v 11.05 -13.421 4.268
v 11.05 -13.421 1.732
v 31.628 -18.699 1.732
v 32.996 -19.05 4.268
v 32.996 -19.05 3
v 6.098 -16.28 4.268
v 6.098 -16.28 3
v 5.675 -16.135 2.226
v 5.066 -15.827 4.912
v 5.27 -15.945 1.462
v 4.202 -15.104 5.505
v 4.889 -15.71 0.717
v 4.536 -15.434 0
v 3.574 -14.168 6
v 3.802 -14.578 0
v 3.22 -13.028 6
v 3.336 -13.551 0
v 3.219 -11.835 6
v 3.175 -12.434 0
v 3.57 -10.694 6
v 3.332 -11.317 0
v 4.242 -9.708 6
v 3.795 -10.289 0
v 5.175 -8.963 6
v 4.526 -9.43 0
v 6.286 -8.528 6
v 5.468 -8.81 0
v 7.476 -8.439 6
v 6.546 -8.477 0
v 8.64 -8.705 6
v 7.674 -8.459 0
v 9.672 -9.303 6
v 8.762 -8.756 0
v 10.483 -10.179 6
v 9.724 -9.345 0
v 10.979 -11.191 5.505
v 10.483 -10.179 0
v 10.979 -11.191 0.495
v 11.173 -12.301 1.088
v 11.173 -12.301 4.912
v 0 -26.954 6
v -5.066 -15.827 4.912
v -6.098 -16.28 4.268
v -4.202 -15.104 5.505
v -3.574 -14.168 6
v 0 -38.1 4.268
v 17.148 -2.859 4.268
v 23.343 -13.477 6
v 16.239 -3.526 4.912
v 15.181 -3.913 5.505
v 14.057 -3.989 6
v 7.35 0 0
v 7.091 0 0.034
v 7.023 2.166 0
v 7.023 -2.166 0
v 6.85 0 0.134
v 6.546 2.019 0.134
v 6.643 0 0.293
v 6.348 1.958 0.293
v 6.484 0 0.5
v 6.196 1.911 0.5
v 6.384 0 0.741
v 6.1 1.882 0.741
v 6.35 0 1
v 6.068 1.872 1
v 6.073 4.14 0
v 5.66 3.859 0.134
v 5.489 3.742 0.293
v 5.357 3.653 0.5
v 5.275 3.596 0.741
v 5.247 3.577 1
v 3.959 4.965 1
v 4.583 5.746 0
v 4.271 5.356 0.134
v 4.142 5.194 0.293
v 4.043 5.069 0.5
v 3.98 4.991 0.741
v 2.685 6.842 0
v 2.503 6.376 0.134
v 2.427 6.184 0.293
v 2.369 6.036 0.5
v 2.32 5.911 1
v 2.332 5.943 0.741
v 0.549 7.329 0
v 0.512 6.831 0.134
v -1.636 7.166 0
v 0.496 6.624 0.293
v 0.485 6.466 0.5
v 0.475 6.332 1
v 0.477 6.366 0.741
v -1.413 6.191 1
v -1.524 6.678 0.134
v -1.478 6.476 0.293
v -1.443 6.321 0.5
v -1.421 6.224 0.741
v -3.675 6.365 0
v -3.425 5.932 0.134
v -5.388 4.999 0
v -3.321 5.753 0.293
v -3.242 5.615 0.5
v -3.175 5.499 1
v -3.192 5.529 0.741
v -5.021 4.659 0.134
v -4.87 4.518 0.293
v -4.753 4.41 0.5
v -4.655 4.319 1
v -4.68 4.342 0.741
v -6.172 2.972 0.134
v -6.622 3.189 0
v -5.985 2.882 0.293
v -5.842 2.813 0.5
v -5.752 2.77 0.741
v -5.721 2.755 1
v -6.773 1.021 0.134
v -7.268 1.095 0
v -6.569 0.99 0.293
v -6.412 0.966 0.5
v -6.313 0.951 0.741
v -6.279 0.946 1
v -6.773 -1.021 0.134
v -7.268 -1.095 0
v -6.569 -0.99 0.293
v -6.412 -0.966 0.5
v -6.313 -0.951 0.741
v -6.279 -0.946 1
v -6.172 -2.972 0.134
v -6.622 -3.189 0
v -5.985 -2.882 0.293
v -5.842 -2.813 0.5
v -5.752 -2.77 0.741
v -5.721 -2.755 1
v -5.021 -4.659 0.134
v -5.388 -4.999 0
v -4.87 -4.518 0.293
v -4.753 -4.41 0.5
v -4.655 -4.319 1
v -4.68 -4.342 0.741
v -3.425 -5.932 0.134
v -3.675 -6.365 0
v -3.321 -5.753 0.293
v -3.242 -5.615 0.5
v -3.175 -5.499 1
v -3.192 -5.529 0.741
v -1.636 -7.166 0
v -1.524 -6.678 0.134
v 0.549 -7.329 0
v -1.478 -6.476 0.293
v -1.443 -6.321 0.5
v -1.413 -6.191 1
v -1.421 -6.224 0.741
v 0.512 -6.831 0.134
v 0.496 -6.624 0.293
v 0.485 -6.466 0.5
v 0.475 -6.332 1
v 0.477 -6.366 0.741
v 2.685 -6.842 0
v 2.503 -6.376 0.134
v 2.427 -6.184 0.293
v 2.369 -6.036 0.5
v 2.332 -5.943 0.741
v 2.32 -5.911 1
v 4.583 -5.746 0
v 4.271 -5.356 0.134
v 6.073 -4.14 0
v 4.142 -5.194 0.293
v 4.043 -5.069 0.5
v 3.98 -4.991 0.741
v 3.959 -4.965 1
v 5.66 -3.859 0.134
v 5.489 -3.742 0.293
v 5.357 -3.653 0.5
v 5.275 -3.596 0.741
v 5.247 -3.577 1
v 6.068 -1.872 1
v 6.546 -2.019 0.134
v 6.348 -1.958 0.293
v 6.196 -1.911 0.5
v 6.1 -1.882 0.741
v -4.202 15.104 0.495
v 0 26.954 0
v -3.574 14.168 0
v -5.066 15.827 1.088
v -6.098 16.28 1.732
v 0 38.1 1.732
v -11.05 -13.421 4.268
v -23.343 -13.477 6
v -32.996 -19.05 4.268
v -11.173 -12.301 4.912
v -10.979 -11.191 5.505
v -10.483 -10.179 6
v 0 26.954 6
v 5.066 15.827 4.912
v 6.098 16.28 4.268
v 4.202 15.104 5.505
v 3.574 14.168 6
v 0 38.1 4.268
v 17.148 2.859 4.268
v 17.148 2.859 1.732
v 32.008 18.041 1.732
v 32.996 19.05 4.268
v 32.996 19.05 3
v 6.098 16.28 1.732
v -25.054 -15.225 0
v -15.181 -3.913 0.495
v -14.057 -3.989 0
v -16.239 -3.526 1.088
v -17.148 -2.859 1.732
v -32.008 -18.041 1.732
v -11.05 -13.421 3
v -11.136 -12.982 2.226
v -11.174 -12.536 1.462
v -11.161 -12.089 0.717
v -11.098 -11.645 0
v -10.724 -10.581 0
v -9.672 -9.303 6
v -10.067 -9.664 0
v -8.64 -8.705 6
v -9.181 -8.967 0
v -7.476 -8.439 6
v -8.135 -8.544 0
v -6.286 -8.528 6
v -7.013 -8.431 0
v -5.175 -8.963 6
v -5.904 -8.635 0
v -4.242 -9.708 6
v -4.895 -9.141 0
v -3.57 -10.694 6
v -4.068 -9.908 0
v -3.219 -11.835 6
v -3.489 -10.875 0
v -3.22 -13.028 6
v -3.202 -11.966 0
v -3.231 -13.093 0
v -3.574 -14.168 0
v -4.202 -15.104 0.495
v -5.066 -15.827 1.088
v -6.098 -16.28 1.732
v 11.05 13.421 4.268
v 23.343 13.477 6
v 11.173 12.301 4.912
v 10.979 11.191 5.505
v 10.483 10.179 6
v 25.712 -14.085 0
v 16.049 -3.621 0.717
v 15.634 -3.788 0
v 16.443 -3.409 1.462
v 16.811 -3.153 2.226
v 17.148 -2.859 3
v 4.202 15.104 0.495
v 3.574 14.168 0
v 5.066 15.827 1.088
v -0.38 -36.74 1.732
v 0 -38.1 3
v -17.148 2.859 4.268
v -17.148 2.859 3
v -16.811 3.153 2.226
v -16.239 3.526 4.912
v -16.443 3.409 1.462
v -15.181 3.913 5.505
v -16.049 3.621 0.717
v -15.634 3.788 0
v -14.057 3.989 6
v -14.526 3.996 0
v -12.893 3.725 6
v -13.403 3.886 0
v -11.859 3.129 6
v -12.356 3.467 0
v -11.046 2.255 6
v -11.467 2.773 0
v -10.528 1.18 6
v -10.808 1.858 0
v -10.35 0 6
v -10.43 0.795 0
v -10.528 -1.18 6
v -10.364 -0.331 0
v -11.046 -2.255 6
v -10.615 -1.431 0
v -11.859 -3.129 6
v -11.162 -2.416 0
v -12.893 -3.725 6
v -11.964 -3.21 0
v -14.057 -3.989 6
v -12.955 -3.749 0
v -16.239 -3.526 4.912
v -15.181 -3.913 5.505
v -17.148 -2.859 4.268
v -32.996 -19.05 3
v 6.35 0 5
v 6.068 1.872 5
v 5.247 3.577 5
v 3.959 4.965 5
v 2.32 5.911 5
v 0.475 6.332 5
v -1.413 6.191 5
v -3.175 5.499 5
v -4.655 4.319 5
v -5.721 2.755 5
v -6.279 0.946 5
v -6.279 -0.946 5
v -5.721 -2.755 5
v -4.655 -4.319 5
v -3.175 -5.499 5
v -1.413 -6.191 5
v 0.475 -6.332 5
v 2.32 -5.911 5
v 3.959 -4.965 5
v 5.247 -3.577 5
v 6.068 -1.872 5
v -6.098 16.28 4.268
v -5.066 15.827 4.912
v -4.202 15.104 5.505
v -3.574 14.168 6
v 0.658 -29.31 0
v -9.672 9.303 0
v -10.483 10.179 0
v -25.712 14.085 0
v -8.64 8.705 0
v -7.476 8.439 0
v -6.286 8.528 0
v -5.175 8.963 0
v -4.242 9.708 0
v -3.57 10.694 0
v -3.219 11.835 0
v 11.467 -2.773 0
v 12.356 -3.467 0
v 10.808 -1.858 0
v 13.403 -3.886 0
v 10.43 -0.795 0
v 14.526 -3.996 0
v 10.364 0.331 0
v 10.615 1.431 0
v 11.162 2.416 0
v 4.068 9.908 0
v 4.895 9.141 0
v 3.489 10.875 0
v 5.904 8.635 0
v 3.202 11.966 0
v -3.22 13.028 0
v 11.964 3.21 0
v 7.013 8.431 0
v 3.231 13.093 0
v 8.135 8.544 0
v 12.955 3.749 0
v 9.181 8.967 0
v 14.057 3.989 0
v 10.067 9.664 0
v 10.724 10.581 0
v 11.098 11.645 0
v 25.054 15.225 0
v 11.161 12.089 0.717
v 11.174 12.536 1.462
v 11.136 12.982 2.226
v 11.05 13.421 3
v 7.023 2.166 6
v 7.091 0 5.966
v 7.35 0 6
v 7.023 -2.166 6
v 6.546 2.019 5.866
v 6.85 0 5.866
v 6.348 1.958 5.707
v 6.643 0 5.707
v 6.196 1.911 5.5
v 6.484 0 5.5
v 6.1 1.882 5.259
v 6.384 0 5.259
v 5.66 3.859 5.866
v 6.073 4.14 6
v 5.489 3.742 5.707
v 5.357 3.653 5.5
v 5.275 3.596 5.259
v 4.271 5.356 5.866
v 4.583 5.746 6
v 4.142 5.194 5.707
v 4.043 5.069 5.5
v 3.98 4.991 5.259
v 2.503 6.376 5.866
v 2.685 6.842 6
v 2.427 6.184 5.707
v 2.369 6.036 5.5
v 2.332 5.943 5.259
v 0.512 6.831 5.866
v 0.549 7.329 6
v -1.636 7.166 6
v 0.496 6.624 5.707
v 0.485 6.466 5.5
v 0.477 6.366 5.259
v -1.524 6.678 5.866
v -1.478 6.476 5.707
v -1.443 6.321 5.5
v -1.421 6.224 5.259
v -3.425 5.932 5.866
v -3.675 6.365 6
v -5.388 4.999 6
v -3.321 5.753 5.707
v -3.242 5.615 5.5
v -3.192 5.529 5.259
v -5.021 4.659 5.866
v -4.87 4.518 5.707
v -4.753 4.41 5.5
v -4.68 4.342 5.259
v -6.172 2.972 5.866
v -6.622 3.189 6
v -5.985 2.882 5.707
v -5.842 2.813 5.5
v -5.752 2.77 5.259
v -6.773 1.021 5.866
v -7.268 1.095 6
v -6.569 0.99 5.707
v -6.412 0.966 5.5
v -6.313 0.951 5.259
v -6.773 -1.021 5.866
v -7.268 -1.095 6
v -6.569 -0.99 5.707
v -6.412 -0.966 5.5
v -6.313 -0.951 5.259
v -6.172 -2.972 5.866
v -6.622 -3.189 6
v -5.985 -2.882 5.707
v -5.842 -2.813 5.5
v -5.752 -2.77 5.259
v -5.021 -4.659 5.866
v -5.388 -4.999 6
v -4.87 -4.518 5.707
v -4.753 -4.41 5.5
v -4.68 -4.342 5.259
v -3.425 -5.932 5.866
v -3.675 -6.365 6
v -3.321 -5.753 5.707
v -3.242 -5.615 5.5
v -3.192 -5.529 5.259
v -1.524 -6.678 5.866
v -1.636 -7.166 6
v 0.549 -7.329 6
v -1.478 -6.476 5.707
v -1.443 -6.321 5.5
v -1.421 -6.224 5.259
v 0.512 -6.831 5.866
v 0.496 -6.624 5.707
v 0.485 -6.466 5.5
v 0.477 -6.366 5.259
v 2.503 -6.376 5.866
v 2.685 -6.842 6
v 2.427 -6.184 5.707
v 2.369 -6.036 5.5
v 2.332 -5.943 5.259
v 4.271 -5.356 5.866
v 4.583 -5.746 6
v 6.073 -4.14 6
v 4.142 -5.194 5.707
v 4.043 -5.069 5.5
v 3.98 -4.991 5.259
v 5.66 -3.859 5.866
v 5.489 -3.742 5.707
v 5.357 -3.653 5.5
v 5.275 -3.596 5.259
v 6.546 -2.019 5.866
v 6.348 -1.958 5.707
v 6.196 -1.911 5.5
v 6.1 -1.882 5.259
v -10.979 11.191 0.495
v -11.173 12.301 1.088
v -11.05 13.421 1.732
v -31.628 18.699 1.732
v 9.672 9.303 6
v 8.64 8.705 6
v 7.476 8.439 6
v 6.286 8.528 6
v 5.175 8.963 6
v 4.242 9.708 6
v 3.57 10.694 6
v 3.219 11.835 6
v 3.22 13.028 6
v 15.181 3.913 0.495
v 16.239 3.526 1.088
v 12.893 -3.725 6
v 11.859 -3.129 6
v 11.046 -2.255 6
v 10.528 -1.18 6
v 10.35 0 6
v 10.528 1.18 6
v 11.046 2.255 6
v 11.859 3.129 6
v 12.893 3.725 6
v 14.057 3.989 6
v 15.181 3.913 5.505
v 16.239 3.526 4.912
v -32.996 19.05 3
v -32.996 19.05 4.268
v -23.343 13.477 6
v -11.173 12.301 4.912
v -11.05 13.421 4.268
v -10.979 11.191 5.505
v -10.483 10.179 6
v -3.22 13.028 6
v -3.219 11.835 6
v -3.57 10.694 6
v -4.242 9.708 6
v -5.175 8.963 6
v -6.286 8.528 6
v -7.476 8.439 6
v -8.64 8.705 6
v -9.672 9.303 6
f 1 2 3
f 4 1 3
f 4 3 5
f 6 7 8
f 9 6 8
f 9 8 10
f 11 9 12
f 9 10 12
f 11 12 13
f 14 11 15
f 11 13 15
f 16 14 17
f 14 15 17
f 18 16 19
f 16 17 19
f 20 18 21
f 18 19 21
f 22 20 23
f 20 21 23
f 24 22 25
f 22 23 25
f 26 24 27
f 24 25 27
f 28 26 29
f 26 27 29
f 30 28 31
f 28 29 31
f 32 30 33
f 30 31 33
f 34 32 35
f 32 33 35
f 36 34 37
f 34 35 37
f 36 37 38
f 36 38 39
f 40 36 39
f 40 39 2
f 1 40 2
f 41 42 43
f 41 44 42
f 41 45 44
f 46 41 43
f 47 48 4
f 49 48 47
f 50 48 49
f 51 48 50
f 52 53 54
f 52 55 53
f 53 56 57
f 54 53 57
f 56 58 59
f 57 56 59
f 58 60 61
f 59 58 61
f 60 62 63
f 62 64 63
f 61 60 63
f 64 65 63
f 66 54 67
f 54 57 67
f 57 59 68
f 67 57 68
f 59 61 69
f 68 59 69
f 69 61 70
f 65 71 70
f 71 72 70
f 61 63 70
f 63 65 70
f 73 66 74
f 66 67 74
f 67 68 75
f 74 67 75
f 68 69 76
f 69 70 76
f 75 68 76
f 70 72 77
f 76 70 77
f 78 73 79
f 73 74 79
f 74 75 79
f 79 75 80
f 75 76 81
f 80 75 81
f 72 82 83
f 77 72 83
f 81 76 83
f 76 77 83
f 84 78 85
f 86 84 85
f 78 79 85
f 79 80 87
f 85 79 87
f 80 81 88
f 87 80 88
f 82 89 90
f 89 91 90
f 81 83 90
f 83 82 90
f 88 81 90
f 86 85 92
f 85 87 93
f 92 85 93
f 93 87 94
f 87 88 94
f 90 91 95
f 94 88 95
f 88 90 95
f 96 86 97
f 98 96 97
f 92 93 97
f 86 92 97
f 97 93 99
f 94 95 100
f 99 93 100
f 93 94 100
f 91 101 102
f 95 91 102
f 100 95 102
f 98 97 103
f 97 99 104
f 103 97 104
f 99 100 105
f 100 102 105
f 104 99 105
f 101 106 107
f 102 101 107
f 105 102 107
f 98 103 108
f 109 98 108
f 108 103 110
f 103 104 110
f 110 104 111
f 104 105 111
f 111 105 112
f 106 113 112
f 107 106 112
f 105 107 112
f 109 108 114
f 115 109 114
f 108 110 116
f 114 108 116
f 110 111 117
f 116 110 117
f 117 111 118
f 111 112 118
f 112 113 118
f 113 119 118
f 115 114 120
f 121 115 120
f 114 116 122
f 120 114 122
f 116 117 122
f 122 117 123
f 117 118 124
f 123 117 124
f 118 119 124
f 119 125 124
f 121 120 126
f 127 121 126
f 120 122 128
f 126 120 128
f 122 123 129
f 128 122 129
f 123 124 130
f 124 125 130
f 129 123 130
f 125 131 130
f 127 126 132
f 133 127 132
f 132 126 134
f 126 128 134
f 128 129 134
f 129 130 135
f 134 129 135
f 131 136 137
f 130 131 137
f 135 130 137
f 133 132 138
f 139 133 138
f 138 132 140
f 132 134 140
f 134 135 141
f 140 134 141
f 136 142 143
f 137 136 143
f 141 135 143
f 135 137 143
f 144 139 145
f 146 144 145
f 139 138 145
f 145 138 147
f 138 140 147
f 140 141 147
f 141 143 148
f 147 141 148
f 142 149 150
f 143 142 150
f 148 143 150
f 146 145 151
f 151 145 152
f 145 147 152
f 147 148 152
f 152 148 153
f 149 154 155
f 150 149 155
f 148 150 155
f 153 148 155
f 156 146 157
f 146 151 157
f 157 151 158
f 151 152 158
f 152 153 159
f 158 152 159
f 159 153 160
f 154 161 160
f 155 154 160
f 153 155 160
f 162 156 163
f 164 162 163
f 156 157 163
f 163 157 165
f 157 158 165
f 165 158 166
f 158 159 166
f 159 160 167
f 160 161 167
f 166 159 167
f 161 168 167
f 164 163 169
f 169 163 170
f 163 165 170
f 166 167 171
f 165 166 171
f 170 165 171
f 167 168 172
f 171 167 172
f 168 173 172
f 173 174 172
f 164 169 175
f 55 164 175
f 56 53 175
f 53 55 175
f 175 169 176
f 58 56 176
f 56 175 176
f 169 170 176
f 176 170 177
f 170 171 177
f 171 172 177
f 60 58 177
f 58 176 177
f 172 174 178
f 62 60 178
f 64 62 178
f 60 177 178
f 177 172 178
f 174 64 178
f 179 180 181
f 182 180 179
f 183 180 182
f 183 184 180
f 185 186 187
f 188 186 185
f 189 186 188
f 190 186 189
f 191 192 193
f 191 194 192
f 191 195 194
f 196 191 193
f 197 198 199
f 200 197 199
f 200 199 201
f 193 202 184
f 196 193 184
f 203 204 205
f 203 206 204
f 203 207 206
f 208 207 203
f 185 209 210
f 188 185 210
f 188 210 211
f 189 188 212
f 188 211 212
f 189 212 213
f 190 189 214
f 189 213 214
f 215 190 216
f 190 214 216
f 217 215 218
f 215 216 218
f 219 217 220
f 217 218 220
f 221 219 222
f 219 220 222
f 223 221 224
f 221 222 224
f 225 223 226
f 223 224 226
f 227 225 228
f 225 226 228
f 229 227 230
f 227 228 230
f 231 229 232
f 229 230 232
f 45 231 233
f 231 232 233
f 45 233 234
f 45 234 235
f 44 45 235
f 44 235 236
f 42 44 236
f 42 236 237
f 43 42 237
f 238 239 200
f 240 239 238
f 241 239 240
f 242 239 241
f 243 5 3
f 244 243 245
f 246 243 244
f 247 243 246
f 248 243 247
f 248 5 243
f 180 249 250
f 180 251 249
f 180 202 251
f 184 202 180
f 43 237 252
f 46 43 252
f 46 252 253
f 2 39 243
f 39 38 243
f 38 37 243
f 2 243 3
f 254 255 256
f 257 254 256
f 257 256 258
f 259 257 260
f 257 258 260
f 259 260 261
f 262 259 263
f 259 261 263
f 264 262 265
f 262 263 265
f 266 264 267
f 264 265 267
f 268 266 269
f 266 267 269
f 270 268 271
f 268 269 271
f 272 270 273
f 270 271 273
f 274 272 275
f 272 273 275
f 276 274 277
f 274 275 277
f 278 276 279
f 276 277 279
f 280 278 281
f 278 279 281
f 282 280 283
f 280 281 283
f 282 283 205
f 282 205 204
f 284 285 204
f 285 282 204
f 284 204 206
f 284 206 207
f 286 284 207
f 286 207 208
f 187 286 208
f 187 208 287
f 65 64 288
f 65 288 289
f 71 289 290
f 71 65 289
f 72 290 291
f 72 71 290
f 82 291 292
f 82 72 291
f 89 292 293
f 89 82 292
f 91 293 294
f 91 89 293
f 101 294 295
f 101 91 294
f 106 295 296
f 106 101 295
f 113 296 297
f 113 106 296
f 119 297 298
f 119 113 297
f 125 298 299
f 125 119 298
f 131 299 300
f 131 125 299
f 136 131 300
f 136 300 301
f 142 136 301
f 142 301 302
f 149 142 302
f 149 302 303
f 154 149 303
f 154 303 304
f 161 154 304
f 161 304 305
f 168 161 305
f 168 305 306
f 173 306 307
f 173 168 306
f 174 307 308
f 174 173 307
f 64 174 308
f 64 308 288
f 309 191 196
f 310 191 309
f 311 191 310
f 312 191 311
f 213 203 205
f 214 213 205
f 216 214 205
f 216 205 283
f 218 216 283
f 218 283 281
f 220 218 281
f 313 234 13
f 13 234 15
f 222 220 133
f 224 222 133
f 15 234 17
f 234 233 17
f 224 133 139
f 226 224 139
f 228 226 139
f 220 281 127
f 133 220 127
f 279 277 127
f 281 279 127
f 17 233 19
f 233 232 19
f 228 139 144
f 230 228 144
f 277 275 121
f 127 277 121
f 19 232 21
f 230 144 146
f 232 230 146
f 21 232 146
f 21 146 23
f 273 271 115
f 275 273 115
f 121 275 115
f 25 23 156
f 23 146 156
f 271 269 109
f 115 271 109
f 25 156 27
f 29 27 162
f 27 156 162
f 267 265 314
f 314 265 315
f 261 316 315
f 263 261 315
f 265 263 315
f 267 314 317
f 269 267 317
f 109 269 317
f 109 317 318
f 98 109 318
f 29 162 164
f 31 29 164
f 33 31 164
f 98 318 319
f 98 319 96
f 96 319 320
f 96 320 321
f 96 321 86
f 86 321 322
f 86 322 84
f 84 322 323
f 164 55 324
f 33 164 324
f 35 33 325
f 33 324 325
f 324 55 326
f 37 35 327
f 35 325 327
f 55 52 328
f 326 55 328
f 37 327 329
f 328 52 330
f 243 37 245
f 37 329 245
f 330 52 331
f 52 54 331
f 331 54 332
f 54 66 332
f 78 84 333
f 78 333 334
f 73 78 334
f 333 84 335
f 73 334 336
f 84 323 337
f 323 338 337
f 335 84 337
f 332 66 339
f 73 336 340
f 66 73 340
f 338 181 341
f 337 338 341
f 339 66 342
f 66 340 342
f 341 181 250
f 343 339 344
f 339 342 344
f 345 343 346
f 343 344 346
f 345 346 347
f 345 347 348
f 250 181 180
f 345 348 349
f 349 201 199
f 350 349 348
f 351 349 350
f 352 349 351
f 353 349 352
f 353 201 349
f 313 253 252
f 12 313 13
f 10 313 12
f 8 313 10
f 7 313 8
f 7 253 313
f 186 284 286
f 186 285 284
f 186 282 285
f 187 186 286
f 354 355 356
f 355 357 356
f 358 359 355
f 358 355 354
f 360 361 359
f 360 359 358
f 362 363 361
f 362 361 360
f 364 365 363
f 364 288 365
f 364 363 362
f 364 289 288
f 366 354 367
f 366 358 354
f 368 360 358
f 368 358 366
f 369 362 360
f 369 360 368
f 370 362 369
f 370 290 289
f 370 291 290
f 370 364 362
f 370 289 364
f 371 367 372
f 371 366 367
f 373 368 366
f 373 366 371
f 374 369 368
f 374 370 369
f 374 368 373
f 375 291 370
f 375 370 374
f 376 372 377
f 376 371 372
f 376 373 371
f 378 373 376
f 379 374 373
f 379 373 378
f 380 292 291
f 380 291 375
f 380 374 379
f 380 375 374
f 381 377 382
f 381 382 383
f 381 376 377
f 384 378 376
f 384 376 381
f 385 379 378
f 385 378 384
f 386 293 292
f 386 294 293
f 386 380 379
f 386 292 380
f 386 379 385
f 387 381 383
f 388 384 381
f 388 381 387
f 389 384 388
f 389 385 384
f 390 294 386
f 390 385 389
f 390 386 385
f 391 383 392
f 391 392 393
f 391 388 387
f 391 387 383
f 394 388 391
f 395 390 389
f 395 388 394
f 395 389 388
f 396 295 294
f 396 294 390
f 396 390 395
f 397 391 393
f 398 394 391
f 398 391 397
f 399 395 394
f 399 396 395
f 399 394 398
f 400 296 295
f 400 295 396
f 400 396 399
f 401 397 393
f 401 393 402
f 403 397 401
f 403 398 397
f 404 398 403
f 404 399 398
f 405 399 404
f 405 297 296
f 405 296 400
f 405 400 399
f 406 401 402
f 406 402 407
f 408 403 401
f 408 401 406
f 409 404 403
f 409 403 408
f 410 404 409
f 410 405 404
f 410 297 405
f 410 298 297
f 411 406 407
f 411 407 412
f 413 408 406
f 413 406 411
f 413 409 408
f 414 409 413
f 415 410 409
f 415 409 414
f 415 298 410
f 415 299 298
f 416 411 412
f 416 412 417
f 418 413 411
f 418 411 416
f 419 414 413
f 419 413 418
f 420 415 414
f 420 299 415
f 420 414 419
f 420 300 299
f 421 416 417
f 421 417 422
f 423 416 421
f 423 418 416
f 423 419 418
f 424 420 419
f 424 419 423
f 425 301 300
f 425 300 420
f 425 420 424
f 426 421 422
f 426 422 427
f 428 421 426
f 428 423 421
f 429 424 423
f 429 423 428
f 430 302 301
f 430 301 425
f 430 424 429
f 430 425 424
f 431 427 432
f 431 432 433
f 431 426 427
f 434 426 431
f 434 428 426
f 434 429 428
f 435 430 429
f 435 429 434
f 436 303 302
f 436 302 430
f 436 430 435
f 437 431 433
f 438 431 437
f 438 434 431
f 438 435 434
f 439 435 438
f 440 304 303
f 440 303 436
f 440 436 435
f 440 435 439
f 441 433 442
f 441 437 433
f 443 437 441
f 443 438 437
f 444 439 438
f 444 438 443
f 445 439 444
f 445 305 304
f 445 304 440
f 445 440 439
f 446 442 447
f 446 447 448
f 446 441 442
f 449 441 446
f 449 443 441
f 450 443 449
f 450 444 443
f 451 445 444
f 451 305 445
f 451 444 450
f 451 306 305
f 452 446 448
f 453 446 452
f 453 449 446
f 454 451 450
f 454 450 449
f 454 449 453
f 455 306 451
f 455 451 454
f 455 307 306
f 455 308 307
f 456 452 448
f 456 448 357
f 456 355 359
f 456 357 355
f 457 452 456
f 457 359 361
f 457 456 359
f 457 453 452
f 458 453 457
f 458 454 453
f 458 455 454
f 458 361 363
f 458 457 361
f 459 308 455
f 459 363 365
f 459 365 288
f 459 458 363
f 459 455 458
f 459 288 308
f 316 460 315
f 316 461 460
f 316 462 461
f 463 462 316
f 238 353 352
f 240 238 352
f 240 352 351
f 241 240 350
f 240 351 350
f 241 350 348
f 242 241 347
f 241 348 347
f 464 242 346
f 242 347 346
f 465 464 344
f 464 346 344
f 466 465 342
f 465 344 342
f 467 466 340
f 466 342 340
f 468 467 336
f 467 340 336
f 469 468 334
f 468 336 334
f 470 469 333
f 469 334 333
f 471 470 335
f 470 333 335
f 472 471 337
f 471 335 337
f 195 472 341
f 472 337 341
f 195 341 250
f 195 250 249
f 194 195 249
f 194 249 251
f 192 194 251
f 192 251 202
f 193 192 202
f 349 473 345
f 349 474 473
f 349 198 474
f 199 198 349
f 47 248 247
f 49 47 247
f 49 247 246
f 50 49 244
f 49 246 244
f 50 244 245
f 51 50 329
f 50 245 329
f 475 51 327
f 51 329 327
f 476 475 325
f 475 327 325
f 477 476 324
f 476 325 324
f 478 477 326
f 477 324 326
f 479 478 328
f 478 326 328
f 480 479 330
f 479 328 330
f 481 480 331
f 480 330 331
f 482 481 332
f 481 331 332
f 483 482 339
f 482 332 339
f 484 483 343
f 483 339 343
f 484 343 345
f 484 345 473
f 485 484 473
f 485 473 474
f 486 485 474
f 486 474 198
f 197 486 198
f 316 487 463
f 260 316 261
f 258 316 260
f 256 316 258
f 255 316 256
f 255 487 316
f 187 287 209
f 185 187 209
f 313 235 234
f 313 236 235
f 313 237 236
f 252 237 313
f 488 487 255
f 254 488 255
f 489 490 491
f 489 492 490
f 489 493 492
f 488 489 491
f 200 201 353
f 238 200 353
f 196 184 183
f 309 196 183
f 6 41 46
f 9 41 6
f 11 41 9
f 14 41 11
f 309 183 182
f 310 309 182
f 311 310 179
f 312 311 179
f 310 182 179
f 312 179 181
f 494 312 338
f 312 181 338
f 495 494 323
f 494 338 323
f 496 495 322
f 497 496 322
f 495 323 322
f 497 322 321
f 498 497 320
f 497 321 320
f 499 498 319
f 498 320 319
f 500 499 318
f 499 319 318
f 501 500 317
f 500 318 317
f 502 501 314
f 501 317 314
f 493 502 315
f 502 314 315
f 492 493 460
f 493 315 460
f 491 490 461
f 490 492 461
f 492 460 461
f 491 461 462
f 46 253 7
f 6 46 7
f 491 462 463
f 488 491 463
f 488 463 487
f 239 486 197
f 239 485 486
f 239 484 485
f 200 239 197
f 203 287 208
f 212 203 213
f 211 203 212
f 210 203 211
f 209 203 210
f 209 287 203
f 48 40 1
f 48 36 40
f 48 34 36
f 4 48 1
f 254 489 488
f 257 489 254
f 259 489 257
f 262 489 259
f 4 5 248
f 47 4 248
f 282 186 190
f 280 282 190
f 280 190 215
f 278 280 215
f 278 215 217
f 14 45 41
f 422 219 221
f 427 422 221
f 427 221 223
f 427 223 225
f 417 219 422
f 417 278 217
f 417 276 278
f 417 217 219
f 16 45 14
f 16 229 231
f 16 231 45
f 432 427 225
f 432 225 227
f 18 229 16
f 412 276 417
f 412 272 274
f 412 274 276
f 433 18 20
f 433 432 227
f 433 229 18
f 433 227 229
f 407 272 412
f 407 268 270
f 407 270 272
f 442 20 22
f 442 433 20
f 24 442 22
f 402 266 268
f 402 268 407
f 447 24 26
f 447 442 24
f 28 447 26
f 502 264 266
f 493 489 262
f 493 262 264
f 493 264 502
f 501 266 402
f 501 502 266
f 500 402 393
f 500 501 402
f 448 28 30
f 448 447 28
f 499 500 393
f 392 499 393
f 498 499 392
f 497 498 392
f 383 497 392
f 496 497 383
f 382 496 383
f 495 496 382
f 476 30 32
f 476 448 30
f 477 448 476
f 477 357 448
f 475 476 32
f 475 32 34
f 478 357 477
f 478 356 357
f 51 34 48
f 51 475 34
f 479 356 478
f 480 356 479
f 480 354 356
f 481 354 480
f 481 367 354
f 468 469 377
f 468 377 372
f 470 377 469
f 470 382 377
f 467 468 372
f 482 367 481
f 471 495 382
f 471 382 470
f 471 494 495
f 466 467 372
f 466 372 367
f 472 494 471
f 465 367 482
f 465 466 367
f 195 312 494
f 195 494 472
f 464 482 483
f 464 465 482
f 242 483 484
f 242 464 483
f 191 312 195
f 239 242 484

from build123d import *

# Parameters (mm, degrees)
F0_R         = 6.35
F1_DEPTH     = 6
F2_C1_SIZE2  = 3
F2_C1_SIZE   = 1.7320508076
F2_C2_SIZE2  = 3
F2_C2_SIZE   = 1.7320508076
F2_C3_SIZE2  = 3
F2_C3_SIZE   = 1.7320508076
F2_C4_SIZE2  = 3
F2_C4_SIZE   = 1.7320508076
F2_C5_SIZE2  = 1.7320508076
F2_C5_SIZE   = 3
F2_C6_SIZE2  = 3
F2_C6_SIZE   = 1.7320508076
F2_C7_SIZE2  = 3
F2_C7_SIZE   = 1.7320508076
F2_C8_SIZE2  = 3
F2_C8_SIZE   = 1.7320508076
F2_C9_SIZE2  = 1.7320508076
F2_C9_SIZE   = 3
F2_C10_SIZE2 = 3
F2_C10_SIZE  = 1.7320508076
F2_C11_SIZE2 = 1.7320508076
F2_C11_SIZE  = 3
F2_C12_SIZE2 = 3
F2_C12_SIZE  = 1.7320508076
F2_C13_SIZE2 = 1.7320508076
F2_C13_SIZE  = 3
F2_C14_SIZE2 = 3
F2_C14_SIZE  = 1.7320508076
F2_C15_SIZE2 = 3
F2_C15_SIZE  = 1.7320508076
F2_C16_SIZE2 = 3
F2_C16_SIZE  = 1.7320508076
F2_C17_SIZE2 = 1.7320508076
F2_C17_SIZE  = 3
F2_C18_SIZE2 = 3
F2_C18_SIZE  = 1.7320508076
F2_C19_SIZE2 = 3
F2_C19_SIZE  = 1.7320508076
F2_C20_SIZE2 = 3
F2_C20_SIZE  = 1.7320508076
F2_C21_SIZE2 = 1.7320508076
F2_C21_SIZE  = 3
F2_C22_SIZE2 = 3
F2_C22_SIZE  = 1.7320508076
F2_C23_SIZE2 = 3
F2_C23_SIZE  = 1.7320508076
F2_C24_SIZE2 = 3
F2_C24_SIZE  = 1.7320508076
F3_R         = 1


with BuildPart() as f1:
    # F0 (on Top) → F1 (new body)
    with BuildSketch(Plane.XY):
        with BuildLine():
            Line((6.0983324846, 16.2798387553), (0, 38.1))
            Line((0, 38.1), (-6.0983324846, 16.2798387553))
            ThreePointArc((-6.0983324846, 16.2798387553), (-5.175, 8.9633629292), (-11.0495876893, 13.42123023))
            Line((-11.0495876893, 13.42123023), (-32.9955678842, 19.05))
            Line((-32.9955678842, 19.05), (-17.1479201739, 2.8586085253))
            ThreePointArc((-17.1479201739, 2.8586085253), (-10.35, 0), (-17.1479201739, -2.8586085253))
            Line((-17.1479201739, -2.8586085253), (-32.9955678842, -19.05))
            Line((-32.9955678842, -19.05), (-11.0495876893, -13.42123023))
            ThreePointArc((-11.0495876893, -13.42123023), (-5.175, -8.9633629292), (-6.0983324846, -16.2798387553))
            Line((-6.0983324846, -16.2798387553), (0, -38.1))
            Line((0, -38.1), (6.0983324846, -16.2798387553))
            ThreePointArc((6.0983324846, -16.2798387553), (5.175, -8.9633629292), (11.0495876893, -13.42123023))
            Line((11.0495876893, -13.42123023), (32.9955678842, -19.05))
            Line((32.9955678842, -19.05), (17.1479201739, -2.8586085253))
            ThreePointArc((17.1479201739, -2.8586085253), (10.35, 0), (17.1479201739, 2.8586085253))
            Line((17.1479201739, 2.8586085253), (32.9955678842, 19.05))
            Line((32.9955678842, 19.05), (11.0495876893, 13.42123023))
            ThreePointArc((11.0495876893, 13.42123023), (5.175, 8.9633629292), (6.0983324846, 16.2798387553))
        make_face()
        Circle(F0_R, mode=Mode.SUBTRACT)
    extrude(amount=F1_DEPTH)

    # F2: chamfer of 3 x 1.7320508076 on 24 edges, made by hand

    # F2_c1
    f2_c1_edges = [f1.edges().sort_by_distance(p)[0] for p in [
        (22.0225777867, -16.235615115, 0),
    ]]
    f2_c1_side = f1.faces().sort_by_distance((22.0225777867, -16.235615115, 0.0346410162))[0]
    chamfer(f2_c1_edges, length=F2_C1_SIZE, length2=F2_C1_SIZE2, reference=f2_c1_side)

    # F2_c2
    f2_c2_edges = [f1.edges().sort_by_distance(p)[0] for p in [
        (22.0225777867, -16.235615115, 6),
    ]]
    f2_c2_side = f1.faces().sort_by_distance((22.0225777867, -16.235615115, 5.9653589838))[0]
    chamfer(f2_c2_edges, length=F2_C2_SIZE, length2=F2_C2_SIZE2, reference=f2_c2_side)

    # F2_c3
    f2_c3_edges = [f1.edges().sort_by_distance(p)[0] for p in [
        (23.0480423242, -8.8867074098, 0),
    ]]
    f2_c3_side = f1.faces().sort_by_distance((23.0232860482, -8.9109381093, 0))[0]
    chamfer(f2_c3_edges, length=F2_C3_SIZE, length2=F2_C3_SIZE2, reference=f2_c3_side)

    # F2_c4
    f2_c4_edges = [f1.edges().sort_by_distance(p)[0] for p in [
        (23.0480423242, -8.8867074098, 6),
    ]]
    f2_c4_side = f1.faces().sort_by_distance((23.0480423242, -8.8867074098, 5.9653589838))[0]
    chamfer(f2_c4_edges, length=F2_C4_SIZE, length2=F2_C4_SIZE2, reference=f2_c4_side)

    # F2_c5
    f2_c5_edges = [f1.edges().sort_by_distance(p)[0] for p in [
        (25.071744029, 10.9543042626, 0),
    ]]
    f2_c5_side = f1.faces().sort_by_distance((25.046987753, 10.9785349621, 0))[0]
    chamfer(f2_c5_edges, length=F2_C5_SIZE, length2=F2_C5_SIZE2, reference=f2_c5_side)

    # F2_c6
    f2_c6_edges = [f1.edges().sort_by_distance(p)[0] for p in [
        (25.071744029, 10.9543042626, 6),
    ]]
    f2_c6_side = f1.faces().sort_by_distance((25.071744029, 10.9543042626, 5.9653589838))[0]
    chamfer(f2_c6_edges, length=F2_C6_SIZE, length2=F2_C6_SIZE2, reference=f2_c6_side)

    # F2_c7
    f2_c7_edges = [f1.edges().sort_by_distance(p)[0] for p in [
        (19.220135535, 15.5168364554, 0),
    ]]
    f2_c7_side = f1.faces().sort_by_distance((19.2287417983, 15.4832815417, 0))[0]
    chamfer(f2_c7_edges, length=F2_C7_SIZE, length2=F2_C7_SIZE2, reference=f2_c7_side)

    # F2_c8
    f2_c8_edges = [f1.edges().sort_by_distance(p)[0] for p in [
        (19.220135535, 15.5168364554, 6),
    ]]
    f2_c8_side = f1.faces().sort_by_distance((19.220135535, 15.5168364554, 5.9653589838))[0]
    chamfer(f2_c8_edges, length=F2_C8_SIZE, length2=F2_C8_SIZE2, reference=f2_c8_side)

    # F2_c9
    f2_c9_edges = [f1.edges().sort_by_distance(p)[0] for p in [
        (3.0491662423, 27.1899193776, 0),
    ]]
    f2_c9_side = f1.faces().sort_by_distance((3.015803703, 27.1805951634, 0))[0]
    chamfer(f2_c9_edges, length=F2_C9_SIZE, length2=F2_C9_SIZE2, reference=f2_c9_side)

    # F2_c10
    f2_c10_edges = [f1.edges().sort_by_distance(p)[0] for p in [
        (3.0491662423, 27.1899193776, 6),
    ]]
    f2_c10_side = f1.faces().sort_by_distance((3.0491662423, 27.1899193776, 5.9653589838))[0]
    chamfer(f2_c10_edges, length=F2_C10_SIZE, length2=F2_C10_SIZE2, reference=f2_c10_side)

    # F2_c11
    f2_c11_edges = [f1.edges().sort_by_distance(p)[0] for p in [
        (-3.8279067892, 24.4035438652, 0),
    ]]
    f2_c11_side = f1.faces().sort_by_distance((-3.7945442499, 24.394219651, 0))[0]
    chamfer(f2_c11_edges, length=F2_C11_SIZE, length2=F2_C11_SIZE2, reference=f2_c11_side)

    # F2_c12
    f2_c12_edges = [f1.edges().sort_by_distance(p)[0] for p in [
        (-3.8279067892, 24.4035438652, 6),
    ]]
    f2_c12_side = f1.faces().sort_by_distance((-3.8279067892, 24.4035438652, 5.9653589838))[0]
    chamfer(f2_c12_edges, length=F2_C12_SIZE, length2=F2_C12_SIZE2, reference=f2_c12_side)

    # F2_c13
    f2_c13_edges = [f1.edges().sort_by_distance(p)[0] for p in [
        (-22.0225777867, 16.235615115, 0),
    ]]
    f2_c13_side = f1.faces().sort_by_distance((-22.03118405, 16.2020602013, 0))[0]
    chamfer(f2_c13_edges, length=F2_C13_SIZE, length2=F2_C13_SIZE2, reference=f2_c13_side)

    # F2_c14
    f2_c14_edges = [f1.edges().sort_by_distance(p)[0] for p in [
        (-22.0225777867, 16.235615115, 6),
    ]]
    f2_c14_side = f1.faces().sort_by_distance((-22.0225777867, 16.235615115, 5.9653589838))[0]
    chamfer(f2_c14_edges, length=F2_C14_SIZE, length2=F2_C14_SIZE2, reference=f2_c14_side)

    # F2_c15
    f2_c15_edges = [f1.edges().sort_by_distance(p)[0] for p in [
        (-23.0480423242, 8.8867074098, 0),
    ]]
    f2_c15_side = f1.faces().sort_by_distance((-23.0232860482, 8.9109381093, 0))[0]
    chamfer(f2_c15_edges, length=F2_C15_SIZE, length2=F2_C15_SIZE2, reference=f2_c15_side)

    # F2_c16
    f2_c16_edges = [f1.edges().sort_by_distance(p)[0] for p in [
        (-23.0480423242, 8.8867074098, 6),
    ]]
    f2_c16_side = f1.faces().sort_by_distance((-23.0480423242, 8.8867074098, 5.9653589838))[0]
    chamfer(f2_c16_edges, length=F2_C16_SIZE, length2=F2_C16_SIZE2, reference=f2_c16_side)

    # F2_c17
    f2_c17_edges = [f1.edges().sort_by_distance(p)[0] for p in [
        (-25.071744029, -10.9543042626, 0),
    ]]
    f2_c17_side = f1.faces().sort_by_distance((-25.046987753, -10.9785349621, 0))[0]
    chamfer(f2_c17_edges, length=F2_C17_SIZE, length2=F2_C17_SIZE2, reference=f2_c17_side)

    # F2_c18
    f2_c18_edges = [f1.edges().sort_by_distance(p)[0] for p in [
        (-25.071744029, -10.9543042626, 6),
    ]]
    f2_c18_side = f1.faces().sort_by_distance((-25.071744029, -10.9543042626, 5.9653589838))[0]
    chamfer(f2_c18_edges, length=F2_C18_SIZE, length2=F2_C18_SIZE2, reference=f2_c18_side)

    # F2_c19
    f2_c19_edges = [f1.edges().sort_by_distance(p)[0] for p in [
        (-19.220135535, -15.5168364554, 0),
    ]]
    f2_c19_side = f1.faces().sort_by_distance((-19.2287417983, -15.4832815417, 0))[0]
    chamfer(f2_c19_edges, length=F2_C19_SIZE, length2=F2_C19_SIZE2, reference=f2_c19_side)

    # F2_c20
    f2_c20_edges = [f1.edges().sort_by_distance(p)[0] for p in [
        (-19.220135535, -15.5168364554, 6),
    ]]
    f2_c20_side = f1.faces().sort_by_distance((-19.220135535, -15.5168364554, 5.9653589838))[0]
    chamfer(f2_c20_edges, length=F2_C20_SIZE, length2=F2_C20_SIZE2, reference=f2_c20_side)

    # F2_c21
    f2_c21_edges = [f1.edges().sort_by_distance(p)[0] for p in [
        (-3.0491662423, -27.1899193776, 0),
    ]]
    f2_c21_side = f1.faces().sort_by_distance((-3.015803703, -27.1805951634, 0))[0]
    chamfer(f2_c21_edges, length=F2_C21_SIZE, length2=F2_C21_SIZE2, reference=f2_c21_side)

    # F2_c22
    f2_c22_edges = [f1.edges().sort_by_distance(p)[0] for p in [
        (-3.0491662423, -27.1899193776, 6),
    ]]
    f2_c22_side = f1.faces().sort_by_distance((-3.0491662423, -27.1899193776, 5.9653589838))[0]
    chamfer(f2_c22_edges, length=F2_C22_SIZE, length2=F2_C22_SIZE2, reference=f2_c22_side)

    # F2_c23
    f2_c23_edges = [f1.edges().sort_by_distance(p)[0] for p in [
        (3.8279067892, -24.4035438652, 0),
    ]]
    f2_c23_side = f1.faces().sort_by_distance((3.7945442499, -24.394219651, 0))[0]
    chamfer(f2_c23_edges, length=F2_C23_SIZE, length2=F2_C23_SIZE2, reference=f2_c23_side)

    # F2_c24
    f2_c24_edges = [f1.edges().sort_by_distance(p)[0] for p in [
        (3.8279067892, -24.4035438652, 6),
    ]]
    f2_c24_side = f1.faces().sort_by_distance((3.8279067892, -24.4035438652, 5.9653589838))[0]
    chamfer(f2_c24_edges, length=F2_C24_SIZE, length2=F2_C24_SIZE2, reference=f2_c24_side)

    # F3
    f3_edges = [f1.edges().sort_by_distance(p)[0] for p in [
        (-6.35, 0, 0),
        (-6.35, 0, 6),
    ]]
    fillet(f3_edges, radius=F3_R)


solid = f1.part
